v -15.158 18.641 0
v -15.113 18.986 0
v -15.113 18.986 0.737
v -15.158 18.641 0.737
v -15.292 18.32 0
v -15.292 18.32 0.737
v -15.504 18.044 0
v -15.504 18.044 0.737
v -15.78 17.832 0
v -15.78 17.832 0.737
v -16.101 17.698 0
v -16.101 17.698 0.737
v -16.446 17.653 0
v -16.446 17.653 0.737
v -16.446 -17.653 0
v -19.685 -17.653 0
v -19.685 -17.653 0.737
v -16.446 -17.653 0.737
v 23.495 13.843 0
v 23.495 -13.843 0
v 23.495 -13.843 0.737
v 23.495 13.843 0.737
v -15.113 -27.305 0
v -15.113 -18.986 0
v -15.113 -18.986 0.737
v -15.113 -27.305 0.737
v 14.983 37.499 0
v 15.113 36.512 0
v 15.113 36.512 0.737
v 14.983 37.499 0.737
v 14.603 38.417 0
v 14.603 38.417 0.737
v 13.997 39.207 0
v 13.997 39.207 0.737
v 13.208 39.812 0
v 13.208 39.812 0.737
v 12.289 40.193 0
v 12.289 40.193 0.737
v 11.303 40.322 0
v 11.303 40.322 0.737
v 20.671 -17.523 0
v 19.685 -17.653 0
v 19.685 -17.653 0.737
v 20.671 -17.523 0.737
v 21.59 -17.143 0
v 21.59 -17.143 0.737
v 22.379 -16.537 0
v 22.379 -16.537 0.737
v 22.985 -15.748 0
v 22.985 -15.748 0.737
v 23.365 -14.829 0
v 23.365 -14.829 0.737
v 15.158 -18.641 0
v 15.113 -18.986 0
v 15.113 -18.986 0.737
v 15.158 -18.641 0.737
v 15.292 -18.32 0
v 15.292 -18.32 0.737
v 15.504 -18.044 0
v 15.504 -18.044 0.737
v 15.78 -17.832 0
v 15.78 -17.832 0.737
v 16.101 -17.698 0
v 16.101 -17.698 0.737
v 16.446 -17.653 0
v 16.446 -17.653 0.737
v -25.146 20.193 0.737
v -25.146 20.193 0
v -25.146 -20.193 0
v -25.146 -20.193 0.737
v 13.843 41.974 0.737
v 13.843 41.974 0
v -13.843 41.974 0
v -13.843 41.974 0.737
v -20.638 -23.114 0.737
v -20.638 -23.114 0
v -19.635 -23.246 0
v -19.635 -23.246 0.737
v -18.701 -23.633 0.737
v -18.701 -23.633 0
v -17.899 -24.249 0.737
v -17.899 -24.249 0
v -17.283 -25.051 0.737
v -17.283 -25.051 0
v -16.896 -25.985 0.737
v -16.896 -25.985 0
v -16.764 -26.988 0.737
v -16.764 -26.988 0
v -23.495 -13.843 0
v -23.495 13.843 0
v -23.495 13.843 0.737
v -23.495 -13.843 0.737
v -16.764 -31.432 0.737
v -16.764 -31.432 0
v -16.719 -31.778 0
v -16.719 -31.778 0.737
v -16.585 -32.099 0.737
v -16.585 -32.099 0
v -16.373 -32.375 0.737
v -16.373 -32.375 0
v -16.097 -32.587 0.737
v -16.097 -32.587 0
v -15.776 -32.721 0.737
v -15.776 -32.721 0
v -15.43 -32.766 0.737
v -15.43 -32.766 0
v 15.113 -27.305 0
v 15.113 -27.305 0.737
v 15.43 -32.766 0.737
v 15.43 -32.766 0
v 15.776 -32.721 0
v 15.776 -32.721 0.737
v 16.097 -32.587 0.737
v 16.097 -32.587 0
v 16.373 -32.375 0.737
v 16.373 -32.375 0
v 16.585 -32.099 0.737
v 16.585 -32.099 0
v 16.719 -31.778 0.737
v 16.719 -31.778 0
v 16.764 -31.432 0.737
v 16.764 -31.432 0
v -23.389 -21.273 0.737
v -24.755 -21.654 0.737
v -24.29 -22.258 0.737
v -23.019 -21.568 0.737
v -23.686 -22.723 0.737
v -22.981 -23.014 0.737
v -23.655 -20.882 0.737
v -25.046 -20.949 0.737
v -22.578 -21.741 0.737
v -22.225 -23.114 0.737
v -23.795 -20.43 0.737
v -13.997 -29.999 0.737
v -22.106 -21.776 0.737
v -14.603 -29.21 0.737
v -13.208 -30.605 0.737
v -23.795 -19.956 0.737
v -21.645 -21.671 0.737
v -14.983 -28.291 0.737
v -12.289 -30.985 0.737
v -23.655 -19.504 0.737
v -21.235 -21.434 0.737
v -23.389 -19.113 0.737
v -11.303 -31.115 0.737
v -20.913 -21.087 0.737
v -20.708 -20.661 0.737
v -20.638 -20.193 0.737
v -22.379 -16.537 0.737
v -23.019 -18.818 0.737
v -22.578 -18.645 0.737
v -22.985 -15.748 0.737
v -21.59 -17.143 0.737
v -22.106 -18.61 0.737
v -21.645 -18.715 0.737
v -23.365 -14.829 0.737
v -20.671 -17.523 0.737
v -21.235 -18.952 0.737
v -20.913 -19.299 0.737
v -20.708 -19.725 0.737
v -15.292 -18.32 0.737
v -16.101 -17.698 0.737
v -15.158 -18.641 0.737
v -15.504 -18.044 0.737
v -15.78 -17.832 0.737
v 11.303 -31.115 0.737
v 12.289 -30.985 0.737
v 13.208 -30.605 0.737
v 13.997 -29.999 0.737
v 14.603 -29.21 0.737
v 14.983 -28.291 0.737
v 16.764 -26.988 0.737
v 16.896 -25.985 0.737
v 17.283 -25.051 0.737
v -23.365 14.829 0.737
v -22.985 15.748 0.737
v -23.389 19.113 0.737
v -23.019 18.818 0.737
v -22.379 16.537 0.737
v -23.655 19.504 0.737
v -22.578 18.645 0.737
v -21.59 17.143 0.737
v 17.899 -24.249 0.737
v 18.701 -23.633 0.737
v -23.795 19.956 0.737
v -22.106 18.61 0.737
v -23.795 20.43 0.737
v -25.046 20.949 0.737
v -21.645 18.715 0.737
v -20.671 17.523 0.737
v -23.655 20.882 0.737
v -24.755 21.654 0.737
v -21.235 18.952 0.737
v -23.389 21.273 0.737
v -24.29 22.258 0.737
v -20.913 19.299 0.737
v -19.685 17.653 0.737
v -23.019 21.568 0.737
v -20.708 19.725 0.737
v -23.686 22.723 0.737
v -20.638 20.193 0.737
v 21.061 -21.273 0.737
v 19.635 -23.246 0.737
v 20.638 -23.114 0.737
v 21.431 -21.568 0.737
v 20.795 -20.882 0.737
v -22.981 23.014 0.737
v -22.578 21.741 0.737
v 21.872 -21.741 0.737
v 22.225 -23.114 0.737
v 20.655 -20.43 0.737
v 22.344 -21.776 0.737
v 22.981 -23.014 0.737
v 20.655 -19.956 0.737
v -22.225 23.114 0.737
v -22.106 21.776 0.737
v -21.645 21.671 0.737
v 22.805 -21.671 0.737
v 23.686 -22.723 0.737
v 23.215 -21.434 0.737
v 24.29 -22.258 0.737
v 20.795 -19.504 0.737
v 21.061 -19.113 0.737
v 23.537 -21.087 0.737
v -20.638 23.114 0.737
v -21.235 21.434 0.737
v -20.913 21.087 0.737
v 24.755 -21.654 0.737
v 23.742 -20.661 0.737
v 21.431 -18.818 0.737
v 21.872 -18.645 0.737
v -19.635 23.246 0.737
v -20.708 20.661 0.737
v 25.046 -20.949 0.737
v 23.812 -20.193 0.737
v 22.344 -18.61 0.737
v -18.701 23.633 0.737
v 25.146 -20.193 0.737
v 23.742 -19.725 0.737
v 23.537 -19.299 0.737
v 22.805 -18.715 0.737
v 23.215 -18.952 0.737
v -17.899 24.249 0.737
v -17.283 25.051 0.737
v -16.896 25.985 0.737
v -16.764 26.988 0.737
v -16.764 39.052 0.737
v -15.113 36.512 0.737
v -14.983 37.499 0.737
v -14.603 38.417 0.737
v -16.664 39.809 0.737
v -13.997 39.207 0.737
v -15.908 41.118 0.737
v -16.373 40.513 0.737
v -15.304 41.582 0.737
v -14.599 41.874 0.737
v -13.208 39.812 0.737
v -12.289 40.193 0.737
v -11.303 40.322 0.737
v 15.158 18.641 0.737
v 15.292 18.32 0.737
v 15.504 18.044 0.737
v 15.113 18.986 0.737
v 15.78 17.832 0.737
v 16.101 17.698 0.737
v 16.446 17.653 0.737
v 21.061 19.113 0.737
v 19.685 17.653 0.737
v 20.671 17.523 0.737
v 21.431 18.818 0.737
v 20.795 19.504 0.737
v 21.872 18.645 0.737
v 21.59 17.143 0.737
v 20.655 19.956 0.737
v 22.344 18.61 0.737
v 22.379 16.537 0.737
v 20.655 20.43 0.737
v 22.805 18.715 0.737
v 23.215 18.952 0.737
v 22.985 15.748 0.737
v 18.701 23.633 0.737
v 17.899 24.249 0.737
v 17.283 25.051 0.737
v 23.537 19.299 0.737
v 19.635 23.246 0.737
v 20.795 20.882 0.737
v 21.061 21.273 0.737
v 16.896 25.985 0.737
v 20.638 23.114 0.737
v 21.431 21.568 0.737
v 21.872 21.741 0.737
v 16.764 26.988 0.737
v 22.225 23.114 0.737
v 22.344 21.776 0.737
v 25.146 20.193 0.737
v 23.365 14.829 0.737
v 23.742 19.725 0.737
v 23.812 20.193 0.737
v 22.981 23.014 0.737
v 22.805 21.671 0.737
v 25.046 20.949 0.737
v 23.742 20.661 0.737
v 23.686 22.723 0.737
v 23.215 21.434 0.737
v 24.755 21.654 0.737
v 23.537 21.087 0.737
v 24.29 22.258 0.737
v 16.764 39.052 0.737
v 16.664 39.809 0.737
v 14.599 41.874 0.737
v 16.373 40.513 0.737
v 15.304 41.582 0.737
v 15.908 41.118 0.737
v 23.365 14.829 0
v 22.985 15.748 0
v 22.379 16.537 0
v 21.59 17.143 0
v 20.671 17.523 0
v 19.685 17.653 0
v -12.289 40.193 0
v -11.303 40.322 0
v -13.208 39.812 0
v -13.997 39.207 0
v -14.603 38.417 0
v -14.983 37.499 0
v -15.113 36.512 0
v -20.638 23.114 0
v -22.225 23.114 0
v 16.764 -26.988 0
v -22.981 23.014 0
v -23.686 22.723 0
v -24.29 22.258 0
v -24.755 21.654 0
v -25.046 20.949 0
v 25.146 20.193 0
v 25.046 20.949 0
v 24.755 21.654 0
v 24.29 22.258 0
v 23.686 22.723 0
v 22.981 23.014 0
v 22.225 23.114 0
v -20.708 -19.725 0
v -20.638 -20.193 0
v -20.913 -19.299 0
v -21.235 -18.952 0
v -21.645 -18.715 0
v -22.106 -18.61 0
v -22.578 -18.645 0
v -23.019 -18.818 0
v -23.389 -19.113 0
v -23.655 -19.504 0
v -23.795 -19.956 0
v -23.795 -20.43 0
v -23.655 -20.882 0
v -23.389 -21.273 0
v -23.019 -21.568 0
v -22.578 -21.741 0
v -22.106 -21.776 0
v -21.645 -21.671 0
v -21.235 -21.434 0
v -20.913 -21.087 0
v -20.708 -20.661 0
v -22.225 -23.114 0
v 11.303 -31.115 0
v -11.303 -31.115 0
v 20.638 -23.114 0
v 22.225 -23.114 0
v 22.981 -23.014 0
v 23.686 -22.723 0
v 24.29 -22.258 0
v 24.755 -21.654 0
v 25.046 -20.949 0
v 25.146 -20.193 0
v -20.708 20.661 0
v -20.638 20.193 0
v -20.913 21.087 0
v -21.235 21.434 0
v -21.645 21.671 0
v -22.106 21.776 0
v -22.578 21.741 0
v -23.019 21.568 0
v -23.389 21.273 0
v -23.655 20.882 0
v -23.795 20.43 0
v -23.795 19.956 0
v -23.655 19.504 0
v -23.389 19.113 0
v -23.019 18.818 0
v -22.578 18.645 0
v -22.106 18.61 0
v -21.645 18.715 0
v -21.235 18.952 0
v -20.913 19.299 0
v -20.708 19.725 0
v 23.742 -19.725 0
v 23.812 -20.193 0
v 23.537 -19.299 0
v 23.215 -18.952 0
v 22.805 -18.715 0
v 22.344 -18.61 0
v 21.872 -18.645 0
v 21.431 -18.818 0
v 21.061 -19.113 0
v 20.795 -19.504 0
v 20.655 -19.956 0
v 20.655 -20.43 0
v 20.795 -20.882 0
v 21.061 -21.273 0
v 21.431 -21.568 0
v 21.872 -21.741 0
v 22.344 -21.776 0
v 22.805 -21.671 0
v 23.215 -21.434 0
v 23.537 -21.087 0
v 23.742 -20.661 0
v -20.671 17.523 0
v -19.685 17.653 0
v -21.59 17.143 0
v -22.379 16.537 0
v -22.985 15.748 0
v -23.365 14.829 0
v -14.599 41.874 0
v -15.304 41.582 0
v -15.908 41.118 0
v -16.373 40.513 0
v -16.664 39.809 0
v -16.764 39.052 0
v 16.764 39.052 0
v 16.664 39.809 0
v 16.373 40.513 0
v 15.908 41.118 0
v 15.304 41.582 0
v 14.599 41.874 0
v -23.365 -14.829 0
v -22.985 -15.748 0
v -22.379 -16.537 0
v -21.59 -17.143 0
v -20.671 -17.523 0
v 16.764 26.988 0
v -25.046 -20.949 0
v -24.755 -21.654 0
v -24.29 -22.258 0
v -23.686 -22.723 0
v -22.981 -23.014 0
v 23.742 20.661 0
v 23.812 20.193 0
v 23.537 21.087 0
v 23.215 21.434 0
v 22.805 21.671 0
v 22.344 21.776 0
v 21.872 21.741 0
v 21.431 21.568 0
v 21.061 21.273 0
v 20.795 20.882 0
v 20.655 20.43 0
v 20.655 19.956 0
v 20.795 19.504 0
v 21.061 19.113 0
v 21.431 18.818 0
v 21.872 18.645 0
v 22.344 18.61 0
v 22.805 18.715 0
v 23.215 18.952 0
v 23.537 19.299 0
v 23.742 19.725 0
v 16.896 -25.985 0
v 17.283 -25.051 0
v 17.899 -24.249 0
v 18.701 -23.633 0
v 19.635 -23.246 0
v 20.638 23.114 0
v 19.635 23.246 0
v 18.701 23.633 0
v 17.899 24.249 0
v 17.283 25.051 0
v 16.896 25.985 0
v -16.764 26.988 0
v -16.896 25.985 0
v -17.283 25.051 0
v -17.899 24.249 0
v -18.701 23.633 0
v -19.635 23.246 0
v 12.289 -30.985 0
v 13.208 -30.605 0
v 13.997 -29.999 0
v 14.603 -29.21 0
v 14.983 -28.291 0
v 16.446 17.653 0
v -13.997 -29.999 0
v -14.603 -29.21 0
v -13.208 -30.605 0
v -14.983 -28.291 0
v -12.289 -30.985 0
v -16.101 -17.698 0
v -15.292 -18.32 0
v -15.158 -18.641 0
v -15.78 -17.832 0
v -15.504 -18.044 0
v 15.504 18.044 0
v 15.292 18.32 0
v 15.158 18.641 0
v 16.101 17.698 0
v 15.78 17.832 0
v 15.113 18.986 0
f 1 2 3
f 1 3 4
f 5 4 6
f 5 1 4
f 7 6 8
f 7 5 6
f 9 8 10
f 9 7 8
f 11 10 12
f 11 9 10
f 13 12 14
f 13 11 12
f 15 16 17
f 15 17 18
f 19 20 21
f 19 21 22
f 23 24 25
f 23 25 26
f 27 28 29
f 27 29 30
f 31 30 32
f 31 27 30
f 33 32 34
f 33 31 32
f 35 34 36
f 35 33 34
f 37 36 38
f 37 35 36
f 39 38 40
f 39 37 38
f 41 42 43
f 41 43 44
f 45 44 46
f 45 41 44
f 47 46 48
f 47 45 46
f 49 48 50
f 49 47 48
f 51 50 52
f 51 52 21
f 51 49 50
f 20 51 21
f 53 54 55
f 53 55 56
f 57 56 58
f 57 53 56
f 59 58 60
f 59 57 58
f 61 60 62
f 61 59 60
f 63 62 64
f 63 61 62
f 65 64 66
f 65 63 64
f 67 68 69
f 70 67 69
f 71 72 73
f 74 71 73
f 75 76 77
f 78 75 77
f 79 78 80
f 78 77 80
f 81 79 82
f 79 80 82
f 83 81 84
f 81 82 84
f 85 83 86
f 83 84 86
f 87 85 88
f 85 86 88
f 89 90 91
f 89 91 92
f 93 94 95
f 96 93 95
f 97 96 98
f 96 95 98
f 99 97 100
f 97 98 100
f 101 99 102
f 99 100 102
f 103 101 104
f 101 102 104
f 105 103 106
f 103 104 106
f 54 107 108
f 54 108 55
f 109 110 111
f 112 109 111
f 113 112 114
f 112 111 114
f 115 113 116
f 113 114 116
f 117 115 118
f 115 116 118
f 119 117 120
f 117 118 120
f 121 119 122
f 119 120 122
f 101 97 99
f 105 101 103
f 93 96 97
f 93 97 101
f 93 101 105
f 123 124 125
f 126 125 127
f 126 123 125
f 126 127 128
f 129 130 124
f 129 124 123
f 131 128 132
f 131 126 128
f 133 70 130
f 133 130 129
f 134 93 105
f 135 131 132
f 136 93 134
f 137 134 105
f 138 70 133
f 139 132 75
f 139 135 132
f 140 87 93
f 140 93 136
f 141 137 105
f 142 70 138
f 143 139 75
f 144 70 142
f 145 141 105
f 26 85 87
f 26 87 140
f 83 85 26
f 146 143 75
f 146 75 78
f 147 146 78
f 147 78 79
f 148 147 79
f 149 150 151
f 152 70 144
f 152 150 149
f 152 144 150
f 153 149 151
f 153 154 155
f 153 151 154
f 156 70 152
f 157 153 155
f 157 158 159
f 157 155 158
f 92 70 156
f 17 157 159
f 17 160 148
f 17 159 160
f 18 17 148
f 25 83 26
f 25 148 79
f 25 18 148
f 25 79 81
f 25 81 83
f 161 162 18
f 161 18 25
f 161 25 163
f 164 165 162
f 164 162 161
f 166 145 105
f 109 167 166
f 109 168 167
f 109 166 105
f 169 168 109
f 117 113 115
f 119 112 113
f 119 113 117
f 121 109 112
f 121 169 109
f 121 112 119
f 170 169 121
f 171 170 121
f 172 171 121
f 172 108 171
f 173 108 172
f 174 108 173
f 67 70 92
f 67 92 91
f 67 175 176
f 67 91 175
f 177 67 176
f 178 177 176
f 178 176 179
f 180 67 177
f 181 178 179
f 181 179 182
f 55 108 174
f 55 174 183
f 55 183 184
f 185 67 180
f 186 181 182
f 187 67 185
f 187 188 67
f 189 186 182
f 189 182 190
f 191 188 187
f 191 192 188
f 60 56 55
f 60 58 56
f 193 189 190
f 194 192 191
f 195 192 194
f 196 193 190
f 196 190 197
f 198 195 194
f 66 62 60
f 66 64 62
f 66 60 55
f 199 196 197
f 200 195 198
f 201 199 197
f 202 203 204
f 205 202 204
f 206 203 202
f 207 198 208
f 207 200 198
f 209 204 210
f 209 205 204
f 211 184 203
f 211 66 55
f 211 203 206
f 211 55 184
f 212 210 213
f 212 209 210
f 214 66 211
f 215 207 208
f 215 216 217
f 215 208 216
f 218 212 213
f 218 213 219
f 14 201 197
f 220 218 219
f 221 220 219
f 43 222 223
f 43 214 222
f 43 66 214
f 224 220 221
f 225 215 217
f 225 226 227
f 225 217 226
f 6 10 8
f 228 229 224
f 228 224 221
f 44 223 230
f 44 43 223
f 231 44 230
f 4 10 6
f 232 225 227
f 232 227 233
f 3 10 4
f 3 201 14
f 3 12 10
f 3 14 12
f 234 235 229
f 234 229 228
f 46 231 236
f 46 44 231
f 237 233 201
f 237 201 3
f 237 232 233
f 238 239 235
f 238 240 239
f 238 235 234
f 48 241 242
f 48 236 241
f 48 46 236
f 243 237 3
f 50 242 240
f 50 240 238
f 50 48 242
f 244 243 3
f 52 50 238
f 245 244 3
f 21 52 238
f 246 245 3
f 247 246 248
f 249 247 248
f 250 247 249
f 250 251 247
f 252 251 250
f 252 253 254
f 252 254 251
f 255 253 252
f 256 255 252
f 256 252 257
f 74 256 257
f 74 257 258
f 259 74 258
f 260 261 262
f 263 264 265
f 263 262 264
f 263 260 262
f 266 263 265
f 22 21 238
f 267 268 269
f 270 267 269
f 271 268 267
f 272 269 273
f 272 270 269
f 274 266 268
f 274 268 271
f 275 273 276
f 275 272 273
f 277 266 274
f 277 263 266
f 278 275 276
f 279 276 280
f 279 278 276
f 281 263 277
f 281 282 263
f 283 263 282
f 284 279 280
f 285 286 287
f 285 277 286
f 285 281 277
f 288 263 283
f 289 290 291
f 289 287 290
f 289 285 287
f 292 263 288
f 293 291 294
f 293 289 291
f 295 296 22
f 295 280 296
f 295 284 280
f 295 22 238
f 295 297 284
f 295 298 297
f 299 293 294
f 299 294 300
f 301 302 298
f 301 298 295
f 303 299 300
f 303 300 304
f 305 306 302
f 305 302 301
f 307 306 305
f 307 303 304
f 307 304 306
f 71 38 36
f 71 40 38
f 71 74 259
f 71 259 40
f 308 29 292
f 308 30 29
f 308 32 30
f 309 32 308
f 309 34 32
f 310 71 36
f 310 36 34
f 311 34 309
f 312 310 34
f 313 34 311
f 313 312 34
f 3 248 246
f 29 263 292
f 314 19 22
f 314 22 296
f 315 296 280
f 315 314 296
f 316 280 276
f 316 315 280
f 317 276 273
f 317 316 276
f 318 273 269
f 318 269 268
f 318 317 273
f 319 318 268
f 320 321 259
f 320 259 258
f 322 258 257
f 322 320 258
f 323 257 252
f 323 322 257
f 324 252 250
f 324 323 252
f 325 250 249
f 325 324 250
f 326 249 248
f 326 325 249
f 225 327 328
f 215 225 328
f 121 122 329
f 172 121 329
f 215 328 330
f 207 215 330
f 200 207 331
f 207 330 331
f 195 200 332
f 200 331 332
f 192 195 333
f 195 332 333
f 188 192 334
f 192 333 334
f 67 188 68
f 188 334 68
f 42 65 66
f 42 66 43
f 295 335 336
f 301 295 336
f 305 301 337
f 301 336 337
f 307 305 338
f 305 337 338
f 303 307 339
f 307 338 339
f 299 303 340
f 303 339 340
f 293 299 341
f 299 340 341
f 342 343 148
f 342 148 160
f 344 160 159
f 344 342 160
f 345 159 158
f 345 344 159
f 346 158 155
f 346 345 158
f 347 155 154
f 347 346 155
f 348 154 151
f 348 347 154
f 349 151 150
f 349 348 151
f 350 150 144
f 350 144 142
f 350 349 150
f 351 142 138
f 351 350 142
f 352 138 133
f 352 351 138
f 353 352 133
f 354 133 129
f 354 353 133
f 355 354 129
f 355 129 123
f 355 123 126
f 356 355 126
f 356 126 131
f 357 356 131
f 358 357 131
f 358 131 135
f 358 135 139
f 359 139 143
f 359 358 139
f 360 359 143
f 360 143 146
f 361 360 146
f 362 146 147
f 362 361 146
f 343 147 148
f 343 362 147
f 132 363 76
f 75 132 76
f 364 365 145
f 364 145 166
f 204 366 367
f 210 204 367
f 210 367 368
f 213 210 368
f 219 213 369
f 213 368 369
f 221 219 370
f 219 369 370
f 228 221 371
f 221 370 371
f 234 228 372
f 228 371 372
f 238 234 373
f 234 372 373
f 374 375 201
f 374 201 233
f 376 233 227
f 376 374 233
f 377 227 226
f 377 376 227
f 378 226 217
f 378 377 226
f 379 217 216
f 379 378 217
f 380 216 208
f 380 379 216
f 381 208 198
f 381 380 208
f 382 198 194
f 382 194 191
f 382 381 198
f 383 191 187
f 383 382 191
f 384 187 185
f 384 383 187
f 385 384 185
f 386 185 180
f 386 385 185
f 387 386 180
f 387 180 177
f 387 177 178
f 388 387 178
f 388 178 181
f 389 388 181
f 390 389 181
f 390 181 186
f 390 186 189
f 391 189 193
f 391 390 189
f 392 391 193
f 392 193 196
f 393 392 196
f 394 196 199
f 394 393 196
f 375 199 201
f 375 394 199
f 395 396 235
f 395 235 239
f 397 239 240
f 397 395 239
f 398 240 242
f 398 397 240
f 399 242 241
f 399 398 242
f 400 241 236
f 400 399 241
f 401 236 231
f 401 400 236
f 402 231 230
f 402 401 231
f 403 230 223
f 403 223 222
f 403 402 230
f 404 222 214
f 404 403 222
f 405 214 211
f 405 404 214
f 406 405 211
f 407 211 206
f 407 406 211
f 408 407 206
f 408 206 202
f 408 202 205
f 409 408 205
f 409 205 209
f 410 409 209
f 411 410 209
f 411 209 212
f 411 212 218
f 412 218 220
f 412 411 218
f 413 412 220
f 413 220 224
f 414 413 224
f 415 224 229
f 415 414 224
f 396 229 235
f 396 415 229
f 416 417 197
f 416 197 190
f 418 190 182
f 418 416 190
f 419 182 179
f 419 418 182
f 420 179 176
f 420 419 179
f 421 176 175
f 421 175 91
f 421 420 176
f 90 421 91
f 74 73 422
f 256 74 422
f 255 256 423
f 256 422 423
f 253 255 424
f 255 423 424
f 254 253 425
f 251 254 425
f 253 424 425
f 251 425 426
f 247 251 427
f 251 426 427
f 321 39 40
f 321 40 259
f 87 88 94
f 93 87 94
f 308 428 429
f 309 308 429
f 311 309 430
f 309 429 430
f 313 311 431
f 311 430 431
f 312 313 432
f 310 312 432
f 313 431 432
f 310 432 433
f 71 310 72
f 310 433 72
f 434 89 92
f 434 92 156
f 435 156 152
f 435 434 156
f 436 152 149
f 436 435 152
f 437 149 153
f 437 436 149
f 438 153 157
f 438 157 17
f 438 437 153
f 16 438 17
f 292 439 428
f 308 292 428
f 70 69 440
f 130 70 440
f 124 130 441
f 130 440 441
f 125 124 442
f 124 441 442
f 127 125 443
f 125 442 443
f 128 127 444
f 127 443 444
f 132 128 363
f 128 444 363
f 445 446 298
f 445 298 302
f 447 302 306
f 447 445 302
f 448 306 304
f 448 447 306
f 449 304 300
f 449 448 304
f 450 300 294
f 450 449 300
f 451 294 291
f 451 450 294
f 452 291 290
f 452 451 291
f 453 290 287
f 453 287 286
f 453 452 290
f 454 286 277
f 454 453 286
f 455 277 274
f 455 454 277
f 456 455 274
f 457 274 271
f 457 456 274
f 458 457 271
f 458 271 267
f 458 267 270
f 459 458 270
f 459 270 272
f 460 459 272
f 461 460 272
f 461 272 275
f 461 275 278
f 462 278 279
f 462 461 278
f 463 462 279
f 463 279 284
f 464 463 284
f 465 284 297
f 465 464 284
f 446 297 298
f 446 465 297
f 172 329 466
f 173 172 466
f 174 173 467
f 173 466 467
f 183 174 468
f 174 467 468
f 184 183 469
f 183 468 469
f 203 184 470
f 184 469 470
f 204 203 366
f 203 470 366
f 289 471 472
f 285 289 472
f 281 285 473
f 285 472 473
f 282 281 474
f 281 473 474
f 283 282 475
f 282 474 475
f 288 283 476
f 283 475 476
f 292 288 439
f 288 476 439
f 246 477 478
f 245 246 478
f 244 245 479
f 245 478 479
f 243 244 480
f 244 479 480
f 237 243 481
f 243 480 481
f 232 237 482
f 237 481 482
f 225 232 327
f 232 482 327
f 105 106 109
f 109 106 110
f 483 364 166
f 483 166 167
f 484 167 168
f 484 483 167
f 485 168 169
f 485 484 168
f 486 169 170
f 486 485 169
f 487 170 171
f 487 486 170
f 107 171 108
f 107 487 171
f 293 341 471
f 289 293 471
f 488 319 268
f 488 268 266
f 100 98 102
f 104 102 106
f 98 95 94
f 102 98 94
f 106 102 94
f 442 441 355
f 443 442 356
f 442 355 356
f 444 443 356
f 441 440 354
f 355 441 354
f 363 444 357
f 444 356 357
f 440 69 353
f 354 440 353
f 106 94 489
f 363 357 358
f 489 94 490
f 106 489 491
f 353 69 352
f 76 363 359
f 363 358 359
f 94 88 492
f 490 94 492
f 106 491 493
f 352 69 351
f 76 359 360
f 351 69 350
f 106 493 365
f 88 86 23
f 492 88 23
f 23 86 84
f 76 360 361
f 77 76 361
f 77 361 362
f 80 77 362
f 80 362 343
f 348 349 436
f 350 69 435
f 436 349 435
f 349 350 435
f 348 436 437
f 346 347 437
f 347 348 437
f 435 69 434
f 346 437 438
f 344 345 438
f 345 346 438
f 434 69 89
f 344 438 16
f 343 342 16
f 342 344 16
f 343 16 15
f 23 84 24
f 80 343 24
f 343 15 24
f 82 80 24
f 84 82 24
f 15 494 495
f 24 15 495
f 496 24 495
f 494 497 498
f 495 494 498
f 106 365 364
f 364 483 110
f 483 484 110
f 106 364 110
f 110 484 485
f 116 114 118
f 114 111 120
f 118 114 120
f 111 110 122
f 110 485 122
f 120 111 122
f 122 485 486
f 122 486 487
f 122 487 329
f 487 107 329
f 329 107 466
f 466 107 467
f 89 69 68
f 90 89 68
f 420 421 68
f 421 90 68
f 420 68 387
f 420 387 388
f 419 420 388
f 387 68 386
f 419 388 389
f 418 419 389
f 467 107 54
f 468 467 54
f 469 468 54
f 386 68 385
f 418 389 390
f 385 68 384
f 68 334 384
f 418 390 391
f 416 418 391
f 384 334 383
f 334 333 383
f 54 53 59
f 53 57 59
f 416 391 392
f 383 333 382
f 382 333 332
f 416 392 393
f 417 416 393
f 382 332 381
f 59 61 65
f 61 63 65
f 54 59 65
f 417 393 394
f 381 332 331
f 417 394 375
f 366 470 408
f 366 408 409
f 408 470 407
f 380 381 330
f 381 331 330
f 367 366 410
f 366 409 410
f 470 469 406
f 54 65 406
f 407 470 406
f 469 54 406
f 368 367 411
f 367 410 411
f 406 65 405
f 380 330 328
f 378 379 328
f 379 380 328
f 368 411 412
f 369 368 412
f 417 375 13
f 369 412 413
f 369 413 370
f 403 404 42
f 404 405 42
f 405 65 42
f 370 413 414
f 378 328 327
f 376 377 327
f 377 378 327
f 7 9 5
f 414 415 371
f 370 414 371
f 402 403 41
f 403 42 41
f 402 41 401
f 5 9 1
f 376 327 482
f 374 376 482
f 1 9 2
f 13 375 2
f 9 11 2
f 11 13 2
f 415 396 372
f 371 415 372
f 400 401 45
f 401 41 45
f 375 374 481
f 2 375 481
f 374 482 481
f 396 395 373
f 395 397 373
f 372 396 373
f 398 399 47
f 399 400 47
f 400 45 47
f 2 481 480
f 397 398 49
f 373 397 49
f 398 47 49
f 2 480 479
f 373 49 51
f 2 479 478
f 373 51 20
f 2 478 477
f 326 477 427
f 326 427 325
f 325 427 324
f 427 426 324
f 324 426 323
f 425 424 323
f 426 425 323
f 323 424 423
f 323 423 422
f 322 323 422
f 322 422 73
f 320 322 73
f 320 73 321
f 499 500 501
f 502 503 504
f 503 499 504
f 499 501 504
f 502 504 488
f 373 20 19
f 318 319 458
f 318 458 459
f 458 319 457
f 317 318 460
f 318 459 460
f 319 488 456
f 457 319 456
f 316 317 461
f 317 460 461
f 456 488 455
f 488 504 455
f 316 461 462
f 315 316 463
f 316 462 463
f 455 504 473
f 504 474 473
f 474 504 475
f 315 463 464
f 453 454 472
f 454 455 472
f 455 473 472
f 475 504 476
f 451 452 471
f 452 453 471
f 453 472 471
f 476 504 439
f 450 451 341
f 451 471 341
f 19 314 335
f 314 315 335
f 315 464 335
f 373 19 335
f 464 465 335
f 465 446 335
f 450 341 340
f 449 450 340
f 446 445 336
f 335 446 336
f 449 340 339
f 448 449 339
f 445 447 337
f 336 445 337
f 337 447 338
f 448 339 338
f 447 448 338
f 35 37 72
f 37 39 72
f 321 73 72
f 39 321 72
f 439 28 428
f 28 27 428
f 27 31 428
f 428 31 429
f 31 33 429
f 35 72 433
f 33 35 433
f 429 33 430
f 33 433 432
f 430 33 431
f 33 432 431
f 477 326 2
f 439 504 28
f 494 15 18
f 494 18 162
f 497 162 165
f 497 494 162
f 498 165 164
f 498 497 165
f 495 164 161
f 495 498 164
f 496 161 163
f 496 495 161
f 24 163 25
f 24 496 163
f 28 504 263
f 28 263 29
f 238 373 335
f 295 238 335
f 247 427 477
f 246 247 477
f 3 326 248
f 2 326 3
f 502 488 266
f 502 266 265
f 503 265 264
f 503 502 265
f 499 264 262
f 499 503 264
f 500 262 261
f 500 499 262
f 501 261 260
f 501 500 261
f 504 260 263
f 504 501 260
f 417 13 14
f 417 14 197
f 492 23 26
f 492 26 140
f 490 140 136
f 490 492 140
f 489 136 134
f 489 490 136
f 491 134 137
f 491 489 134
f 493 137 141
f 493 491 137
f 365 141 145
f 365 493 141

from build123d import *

# Parameters (mm, degrees)
SKETCH1_R           = 1.5875
BOSS_EXTRUDE1_DEPTH = 0.7366


with BuildPart() as part:
    # Sketch1 → Boss-Extrude1 (new body)
    with BuildSketch(Plane.XY):
        with BuildLine():
            Line((-16.764, -26.9875), (-16.764, -31.4325))
            ThreePointArc((-16.764, -31.4325), (-16.373426893, -32.375426893), (-15.4305, -32.766))
            Line((-15.4305, -32.766), (15.4305, -32.766))
            ThreePointArc((15.4305, -32.766), (16.373426893, -32.375426893), (16.764, -31.4325))
            Line((16.764, -31.4325), (16.764, -26.9875))
            ThreePointArc((16.764, -26.9875), (17.898521883, -24.248521883), (20.6375, -23.114))
            Line((20.6375, -23.114), (22.225, -23.114))
            ThreePointArc((22.225, -23.114), (24.290458908, -22.258458908), (25.146, -20.193))
            Line((25.146, -20.193), (25.146, 20.193))
            ThreePointArc((25.146, 20.193), (24.290458908, 22.258458908), (22.225, 23.114))
            Line((22.225, 23.114), (20.6375, 23.114))
            ThreePointArc((20.6375, 23.114), (17.898521883, 24.248521883), (16.764, 26.9875))
            Line((16.764, 26.9875), (16.764, 39.0525))
            ThreePointArc((16.764, 39.0525), (15.908458908, 41.117958908), (13.843, 41.9735))
            Line((13.843, 41.9735), (-13.843, 41.9735))
            ThreePointArc((-13.843, 41.9735), (-15.908458908, 41.117958908), (-16.764, 39.0525))
            Line((-16.764, 39.0525), (-16.764, 26.9875))
            ThreePointArc((-16.764, 26.9875), (-17.898521883, 24.248521883), (-20.6375, 23.114))
            Line((-20.6375, 23.114), (-22.225, 23.114))
            ThreePointArc((-22.225, 23.114), (-24.290458908, 22.258458908), (-25.146, 20.193))
            Line((-25.146, 20.193), (-25.146, -20.193))
            ThreePointArc((-25.146, -20.193), (-24.290458908, -22.258458908), (-22.225, -23.114))
            Line((-22.225, -23.114), (-20.6375, -23.114))
            ThreePointArc((-20.6375, -23.114), (-17.898521883, -24.248521883), (-16.764, -26.9875))
        make_face()
        with Locations((-22.225, 20.193)):
            Circle(SKETCH1_R, mode=Mode.SUBTRACT)
        with Locations((22.225, 20.193)):
            Circle(SKETCH1_R, mode=Mode.SUBTRACT)
        with Locations((22.225, -20.193)):
            Circle(SKETCH1_R, mode=Mode.SUBTRACT)
        with Locations((-22.225, -20.193)):
            Circle(SKETCH1_R, mode=Mode.SUBTRACT)
        with BuildLine():
            Line((15.113, -27.305), (15.113, -18.9865))
            ThreePointArc((15.113, -18.9865), (15.503573107, -18.043573107), (16.4465, -17.653))
            Line((16.4465, -17.653), (19.685, -17.653))
            ThreePointArc((19.685, -17.653), (22.379076836, -16.537076836), (23.495, -13.843))
            Line((23.495, -13.843), (23.495, 13.843))
            ThreePointArc((23.495, 13.843), (22.379076836, 16.537076836), (19.685, 17.653))
            Line((19.685, 17.653), (16.4465, 17.653))
            ThreePointArc((16.4465, 17.653), (15.503573107, 18.043573107), (15.113, 18.9865))
            Line((15.113, 18.9865), (15.113, 36.5125))
            ThreePointArc((15.113, 36.5125), (13.997076836, 39.206576836), (11.303, 40.3225))
            Line((11.303, 40.3225), (-11.303, 40.3225))
            ThreePointArc((-11.303, 40.3225), (-13.997076836, 39.206576836), (-15.113, 36.5125))
            Line((-15.113, 36.5125), (-15.113, 18.9865))
            ThreePointArc((-15.113, 18.9865), (-15.503573107, 18.043573107), (-16.4465, 17.653))
            Line((-16.4465, 17.653), (-19.685, 17.653))
            ThreePointArc((-19.685, 17.653), (-22.379076836, 16.537076836), (-23.495, 13.843))
            Line((-23.495, 13.843), (-23.495, -13.843))
            ThreePointArc((-23.495, -13.843), (-22.379076836, -16.537076836), (-19.685, -17.653))
            Line((-19.685, -17.653), (-16.4465, -17.653))
            ThreePointArc((-16.4465, -17.653), (-15.503573107, -18.043573107), (-15.113, -18.9865))
            Line((-15.113, -18.9865), (-15.113, -27.305))
            ThreePointArc((-15.113, -27.305), (-13.997076836, -29.999076836), (-11.303, -31.115))
            Line((-11.303, -31.115), (11.303, -31.115))
            ThreePointArc((11.303, -31.115), (13.997076836, -29.999076836), (15.113, -27.305))
        make_face(mode=Mode.SUBTRACT)
    extrude(amount=BOSS_EXTRUDE1_DEPTH)


solid = part.part
